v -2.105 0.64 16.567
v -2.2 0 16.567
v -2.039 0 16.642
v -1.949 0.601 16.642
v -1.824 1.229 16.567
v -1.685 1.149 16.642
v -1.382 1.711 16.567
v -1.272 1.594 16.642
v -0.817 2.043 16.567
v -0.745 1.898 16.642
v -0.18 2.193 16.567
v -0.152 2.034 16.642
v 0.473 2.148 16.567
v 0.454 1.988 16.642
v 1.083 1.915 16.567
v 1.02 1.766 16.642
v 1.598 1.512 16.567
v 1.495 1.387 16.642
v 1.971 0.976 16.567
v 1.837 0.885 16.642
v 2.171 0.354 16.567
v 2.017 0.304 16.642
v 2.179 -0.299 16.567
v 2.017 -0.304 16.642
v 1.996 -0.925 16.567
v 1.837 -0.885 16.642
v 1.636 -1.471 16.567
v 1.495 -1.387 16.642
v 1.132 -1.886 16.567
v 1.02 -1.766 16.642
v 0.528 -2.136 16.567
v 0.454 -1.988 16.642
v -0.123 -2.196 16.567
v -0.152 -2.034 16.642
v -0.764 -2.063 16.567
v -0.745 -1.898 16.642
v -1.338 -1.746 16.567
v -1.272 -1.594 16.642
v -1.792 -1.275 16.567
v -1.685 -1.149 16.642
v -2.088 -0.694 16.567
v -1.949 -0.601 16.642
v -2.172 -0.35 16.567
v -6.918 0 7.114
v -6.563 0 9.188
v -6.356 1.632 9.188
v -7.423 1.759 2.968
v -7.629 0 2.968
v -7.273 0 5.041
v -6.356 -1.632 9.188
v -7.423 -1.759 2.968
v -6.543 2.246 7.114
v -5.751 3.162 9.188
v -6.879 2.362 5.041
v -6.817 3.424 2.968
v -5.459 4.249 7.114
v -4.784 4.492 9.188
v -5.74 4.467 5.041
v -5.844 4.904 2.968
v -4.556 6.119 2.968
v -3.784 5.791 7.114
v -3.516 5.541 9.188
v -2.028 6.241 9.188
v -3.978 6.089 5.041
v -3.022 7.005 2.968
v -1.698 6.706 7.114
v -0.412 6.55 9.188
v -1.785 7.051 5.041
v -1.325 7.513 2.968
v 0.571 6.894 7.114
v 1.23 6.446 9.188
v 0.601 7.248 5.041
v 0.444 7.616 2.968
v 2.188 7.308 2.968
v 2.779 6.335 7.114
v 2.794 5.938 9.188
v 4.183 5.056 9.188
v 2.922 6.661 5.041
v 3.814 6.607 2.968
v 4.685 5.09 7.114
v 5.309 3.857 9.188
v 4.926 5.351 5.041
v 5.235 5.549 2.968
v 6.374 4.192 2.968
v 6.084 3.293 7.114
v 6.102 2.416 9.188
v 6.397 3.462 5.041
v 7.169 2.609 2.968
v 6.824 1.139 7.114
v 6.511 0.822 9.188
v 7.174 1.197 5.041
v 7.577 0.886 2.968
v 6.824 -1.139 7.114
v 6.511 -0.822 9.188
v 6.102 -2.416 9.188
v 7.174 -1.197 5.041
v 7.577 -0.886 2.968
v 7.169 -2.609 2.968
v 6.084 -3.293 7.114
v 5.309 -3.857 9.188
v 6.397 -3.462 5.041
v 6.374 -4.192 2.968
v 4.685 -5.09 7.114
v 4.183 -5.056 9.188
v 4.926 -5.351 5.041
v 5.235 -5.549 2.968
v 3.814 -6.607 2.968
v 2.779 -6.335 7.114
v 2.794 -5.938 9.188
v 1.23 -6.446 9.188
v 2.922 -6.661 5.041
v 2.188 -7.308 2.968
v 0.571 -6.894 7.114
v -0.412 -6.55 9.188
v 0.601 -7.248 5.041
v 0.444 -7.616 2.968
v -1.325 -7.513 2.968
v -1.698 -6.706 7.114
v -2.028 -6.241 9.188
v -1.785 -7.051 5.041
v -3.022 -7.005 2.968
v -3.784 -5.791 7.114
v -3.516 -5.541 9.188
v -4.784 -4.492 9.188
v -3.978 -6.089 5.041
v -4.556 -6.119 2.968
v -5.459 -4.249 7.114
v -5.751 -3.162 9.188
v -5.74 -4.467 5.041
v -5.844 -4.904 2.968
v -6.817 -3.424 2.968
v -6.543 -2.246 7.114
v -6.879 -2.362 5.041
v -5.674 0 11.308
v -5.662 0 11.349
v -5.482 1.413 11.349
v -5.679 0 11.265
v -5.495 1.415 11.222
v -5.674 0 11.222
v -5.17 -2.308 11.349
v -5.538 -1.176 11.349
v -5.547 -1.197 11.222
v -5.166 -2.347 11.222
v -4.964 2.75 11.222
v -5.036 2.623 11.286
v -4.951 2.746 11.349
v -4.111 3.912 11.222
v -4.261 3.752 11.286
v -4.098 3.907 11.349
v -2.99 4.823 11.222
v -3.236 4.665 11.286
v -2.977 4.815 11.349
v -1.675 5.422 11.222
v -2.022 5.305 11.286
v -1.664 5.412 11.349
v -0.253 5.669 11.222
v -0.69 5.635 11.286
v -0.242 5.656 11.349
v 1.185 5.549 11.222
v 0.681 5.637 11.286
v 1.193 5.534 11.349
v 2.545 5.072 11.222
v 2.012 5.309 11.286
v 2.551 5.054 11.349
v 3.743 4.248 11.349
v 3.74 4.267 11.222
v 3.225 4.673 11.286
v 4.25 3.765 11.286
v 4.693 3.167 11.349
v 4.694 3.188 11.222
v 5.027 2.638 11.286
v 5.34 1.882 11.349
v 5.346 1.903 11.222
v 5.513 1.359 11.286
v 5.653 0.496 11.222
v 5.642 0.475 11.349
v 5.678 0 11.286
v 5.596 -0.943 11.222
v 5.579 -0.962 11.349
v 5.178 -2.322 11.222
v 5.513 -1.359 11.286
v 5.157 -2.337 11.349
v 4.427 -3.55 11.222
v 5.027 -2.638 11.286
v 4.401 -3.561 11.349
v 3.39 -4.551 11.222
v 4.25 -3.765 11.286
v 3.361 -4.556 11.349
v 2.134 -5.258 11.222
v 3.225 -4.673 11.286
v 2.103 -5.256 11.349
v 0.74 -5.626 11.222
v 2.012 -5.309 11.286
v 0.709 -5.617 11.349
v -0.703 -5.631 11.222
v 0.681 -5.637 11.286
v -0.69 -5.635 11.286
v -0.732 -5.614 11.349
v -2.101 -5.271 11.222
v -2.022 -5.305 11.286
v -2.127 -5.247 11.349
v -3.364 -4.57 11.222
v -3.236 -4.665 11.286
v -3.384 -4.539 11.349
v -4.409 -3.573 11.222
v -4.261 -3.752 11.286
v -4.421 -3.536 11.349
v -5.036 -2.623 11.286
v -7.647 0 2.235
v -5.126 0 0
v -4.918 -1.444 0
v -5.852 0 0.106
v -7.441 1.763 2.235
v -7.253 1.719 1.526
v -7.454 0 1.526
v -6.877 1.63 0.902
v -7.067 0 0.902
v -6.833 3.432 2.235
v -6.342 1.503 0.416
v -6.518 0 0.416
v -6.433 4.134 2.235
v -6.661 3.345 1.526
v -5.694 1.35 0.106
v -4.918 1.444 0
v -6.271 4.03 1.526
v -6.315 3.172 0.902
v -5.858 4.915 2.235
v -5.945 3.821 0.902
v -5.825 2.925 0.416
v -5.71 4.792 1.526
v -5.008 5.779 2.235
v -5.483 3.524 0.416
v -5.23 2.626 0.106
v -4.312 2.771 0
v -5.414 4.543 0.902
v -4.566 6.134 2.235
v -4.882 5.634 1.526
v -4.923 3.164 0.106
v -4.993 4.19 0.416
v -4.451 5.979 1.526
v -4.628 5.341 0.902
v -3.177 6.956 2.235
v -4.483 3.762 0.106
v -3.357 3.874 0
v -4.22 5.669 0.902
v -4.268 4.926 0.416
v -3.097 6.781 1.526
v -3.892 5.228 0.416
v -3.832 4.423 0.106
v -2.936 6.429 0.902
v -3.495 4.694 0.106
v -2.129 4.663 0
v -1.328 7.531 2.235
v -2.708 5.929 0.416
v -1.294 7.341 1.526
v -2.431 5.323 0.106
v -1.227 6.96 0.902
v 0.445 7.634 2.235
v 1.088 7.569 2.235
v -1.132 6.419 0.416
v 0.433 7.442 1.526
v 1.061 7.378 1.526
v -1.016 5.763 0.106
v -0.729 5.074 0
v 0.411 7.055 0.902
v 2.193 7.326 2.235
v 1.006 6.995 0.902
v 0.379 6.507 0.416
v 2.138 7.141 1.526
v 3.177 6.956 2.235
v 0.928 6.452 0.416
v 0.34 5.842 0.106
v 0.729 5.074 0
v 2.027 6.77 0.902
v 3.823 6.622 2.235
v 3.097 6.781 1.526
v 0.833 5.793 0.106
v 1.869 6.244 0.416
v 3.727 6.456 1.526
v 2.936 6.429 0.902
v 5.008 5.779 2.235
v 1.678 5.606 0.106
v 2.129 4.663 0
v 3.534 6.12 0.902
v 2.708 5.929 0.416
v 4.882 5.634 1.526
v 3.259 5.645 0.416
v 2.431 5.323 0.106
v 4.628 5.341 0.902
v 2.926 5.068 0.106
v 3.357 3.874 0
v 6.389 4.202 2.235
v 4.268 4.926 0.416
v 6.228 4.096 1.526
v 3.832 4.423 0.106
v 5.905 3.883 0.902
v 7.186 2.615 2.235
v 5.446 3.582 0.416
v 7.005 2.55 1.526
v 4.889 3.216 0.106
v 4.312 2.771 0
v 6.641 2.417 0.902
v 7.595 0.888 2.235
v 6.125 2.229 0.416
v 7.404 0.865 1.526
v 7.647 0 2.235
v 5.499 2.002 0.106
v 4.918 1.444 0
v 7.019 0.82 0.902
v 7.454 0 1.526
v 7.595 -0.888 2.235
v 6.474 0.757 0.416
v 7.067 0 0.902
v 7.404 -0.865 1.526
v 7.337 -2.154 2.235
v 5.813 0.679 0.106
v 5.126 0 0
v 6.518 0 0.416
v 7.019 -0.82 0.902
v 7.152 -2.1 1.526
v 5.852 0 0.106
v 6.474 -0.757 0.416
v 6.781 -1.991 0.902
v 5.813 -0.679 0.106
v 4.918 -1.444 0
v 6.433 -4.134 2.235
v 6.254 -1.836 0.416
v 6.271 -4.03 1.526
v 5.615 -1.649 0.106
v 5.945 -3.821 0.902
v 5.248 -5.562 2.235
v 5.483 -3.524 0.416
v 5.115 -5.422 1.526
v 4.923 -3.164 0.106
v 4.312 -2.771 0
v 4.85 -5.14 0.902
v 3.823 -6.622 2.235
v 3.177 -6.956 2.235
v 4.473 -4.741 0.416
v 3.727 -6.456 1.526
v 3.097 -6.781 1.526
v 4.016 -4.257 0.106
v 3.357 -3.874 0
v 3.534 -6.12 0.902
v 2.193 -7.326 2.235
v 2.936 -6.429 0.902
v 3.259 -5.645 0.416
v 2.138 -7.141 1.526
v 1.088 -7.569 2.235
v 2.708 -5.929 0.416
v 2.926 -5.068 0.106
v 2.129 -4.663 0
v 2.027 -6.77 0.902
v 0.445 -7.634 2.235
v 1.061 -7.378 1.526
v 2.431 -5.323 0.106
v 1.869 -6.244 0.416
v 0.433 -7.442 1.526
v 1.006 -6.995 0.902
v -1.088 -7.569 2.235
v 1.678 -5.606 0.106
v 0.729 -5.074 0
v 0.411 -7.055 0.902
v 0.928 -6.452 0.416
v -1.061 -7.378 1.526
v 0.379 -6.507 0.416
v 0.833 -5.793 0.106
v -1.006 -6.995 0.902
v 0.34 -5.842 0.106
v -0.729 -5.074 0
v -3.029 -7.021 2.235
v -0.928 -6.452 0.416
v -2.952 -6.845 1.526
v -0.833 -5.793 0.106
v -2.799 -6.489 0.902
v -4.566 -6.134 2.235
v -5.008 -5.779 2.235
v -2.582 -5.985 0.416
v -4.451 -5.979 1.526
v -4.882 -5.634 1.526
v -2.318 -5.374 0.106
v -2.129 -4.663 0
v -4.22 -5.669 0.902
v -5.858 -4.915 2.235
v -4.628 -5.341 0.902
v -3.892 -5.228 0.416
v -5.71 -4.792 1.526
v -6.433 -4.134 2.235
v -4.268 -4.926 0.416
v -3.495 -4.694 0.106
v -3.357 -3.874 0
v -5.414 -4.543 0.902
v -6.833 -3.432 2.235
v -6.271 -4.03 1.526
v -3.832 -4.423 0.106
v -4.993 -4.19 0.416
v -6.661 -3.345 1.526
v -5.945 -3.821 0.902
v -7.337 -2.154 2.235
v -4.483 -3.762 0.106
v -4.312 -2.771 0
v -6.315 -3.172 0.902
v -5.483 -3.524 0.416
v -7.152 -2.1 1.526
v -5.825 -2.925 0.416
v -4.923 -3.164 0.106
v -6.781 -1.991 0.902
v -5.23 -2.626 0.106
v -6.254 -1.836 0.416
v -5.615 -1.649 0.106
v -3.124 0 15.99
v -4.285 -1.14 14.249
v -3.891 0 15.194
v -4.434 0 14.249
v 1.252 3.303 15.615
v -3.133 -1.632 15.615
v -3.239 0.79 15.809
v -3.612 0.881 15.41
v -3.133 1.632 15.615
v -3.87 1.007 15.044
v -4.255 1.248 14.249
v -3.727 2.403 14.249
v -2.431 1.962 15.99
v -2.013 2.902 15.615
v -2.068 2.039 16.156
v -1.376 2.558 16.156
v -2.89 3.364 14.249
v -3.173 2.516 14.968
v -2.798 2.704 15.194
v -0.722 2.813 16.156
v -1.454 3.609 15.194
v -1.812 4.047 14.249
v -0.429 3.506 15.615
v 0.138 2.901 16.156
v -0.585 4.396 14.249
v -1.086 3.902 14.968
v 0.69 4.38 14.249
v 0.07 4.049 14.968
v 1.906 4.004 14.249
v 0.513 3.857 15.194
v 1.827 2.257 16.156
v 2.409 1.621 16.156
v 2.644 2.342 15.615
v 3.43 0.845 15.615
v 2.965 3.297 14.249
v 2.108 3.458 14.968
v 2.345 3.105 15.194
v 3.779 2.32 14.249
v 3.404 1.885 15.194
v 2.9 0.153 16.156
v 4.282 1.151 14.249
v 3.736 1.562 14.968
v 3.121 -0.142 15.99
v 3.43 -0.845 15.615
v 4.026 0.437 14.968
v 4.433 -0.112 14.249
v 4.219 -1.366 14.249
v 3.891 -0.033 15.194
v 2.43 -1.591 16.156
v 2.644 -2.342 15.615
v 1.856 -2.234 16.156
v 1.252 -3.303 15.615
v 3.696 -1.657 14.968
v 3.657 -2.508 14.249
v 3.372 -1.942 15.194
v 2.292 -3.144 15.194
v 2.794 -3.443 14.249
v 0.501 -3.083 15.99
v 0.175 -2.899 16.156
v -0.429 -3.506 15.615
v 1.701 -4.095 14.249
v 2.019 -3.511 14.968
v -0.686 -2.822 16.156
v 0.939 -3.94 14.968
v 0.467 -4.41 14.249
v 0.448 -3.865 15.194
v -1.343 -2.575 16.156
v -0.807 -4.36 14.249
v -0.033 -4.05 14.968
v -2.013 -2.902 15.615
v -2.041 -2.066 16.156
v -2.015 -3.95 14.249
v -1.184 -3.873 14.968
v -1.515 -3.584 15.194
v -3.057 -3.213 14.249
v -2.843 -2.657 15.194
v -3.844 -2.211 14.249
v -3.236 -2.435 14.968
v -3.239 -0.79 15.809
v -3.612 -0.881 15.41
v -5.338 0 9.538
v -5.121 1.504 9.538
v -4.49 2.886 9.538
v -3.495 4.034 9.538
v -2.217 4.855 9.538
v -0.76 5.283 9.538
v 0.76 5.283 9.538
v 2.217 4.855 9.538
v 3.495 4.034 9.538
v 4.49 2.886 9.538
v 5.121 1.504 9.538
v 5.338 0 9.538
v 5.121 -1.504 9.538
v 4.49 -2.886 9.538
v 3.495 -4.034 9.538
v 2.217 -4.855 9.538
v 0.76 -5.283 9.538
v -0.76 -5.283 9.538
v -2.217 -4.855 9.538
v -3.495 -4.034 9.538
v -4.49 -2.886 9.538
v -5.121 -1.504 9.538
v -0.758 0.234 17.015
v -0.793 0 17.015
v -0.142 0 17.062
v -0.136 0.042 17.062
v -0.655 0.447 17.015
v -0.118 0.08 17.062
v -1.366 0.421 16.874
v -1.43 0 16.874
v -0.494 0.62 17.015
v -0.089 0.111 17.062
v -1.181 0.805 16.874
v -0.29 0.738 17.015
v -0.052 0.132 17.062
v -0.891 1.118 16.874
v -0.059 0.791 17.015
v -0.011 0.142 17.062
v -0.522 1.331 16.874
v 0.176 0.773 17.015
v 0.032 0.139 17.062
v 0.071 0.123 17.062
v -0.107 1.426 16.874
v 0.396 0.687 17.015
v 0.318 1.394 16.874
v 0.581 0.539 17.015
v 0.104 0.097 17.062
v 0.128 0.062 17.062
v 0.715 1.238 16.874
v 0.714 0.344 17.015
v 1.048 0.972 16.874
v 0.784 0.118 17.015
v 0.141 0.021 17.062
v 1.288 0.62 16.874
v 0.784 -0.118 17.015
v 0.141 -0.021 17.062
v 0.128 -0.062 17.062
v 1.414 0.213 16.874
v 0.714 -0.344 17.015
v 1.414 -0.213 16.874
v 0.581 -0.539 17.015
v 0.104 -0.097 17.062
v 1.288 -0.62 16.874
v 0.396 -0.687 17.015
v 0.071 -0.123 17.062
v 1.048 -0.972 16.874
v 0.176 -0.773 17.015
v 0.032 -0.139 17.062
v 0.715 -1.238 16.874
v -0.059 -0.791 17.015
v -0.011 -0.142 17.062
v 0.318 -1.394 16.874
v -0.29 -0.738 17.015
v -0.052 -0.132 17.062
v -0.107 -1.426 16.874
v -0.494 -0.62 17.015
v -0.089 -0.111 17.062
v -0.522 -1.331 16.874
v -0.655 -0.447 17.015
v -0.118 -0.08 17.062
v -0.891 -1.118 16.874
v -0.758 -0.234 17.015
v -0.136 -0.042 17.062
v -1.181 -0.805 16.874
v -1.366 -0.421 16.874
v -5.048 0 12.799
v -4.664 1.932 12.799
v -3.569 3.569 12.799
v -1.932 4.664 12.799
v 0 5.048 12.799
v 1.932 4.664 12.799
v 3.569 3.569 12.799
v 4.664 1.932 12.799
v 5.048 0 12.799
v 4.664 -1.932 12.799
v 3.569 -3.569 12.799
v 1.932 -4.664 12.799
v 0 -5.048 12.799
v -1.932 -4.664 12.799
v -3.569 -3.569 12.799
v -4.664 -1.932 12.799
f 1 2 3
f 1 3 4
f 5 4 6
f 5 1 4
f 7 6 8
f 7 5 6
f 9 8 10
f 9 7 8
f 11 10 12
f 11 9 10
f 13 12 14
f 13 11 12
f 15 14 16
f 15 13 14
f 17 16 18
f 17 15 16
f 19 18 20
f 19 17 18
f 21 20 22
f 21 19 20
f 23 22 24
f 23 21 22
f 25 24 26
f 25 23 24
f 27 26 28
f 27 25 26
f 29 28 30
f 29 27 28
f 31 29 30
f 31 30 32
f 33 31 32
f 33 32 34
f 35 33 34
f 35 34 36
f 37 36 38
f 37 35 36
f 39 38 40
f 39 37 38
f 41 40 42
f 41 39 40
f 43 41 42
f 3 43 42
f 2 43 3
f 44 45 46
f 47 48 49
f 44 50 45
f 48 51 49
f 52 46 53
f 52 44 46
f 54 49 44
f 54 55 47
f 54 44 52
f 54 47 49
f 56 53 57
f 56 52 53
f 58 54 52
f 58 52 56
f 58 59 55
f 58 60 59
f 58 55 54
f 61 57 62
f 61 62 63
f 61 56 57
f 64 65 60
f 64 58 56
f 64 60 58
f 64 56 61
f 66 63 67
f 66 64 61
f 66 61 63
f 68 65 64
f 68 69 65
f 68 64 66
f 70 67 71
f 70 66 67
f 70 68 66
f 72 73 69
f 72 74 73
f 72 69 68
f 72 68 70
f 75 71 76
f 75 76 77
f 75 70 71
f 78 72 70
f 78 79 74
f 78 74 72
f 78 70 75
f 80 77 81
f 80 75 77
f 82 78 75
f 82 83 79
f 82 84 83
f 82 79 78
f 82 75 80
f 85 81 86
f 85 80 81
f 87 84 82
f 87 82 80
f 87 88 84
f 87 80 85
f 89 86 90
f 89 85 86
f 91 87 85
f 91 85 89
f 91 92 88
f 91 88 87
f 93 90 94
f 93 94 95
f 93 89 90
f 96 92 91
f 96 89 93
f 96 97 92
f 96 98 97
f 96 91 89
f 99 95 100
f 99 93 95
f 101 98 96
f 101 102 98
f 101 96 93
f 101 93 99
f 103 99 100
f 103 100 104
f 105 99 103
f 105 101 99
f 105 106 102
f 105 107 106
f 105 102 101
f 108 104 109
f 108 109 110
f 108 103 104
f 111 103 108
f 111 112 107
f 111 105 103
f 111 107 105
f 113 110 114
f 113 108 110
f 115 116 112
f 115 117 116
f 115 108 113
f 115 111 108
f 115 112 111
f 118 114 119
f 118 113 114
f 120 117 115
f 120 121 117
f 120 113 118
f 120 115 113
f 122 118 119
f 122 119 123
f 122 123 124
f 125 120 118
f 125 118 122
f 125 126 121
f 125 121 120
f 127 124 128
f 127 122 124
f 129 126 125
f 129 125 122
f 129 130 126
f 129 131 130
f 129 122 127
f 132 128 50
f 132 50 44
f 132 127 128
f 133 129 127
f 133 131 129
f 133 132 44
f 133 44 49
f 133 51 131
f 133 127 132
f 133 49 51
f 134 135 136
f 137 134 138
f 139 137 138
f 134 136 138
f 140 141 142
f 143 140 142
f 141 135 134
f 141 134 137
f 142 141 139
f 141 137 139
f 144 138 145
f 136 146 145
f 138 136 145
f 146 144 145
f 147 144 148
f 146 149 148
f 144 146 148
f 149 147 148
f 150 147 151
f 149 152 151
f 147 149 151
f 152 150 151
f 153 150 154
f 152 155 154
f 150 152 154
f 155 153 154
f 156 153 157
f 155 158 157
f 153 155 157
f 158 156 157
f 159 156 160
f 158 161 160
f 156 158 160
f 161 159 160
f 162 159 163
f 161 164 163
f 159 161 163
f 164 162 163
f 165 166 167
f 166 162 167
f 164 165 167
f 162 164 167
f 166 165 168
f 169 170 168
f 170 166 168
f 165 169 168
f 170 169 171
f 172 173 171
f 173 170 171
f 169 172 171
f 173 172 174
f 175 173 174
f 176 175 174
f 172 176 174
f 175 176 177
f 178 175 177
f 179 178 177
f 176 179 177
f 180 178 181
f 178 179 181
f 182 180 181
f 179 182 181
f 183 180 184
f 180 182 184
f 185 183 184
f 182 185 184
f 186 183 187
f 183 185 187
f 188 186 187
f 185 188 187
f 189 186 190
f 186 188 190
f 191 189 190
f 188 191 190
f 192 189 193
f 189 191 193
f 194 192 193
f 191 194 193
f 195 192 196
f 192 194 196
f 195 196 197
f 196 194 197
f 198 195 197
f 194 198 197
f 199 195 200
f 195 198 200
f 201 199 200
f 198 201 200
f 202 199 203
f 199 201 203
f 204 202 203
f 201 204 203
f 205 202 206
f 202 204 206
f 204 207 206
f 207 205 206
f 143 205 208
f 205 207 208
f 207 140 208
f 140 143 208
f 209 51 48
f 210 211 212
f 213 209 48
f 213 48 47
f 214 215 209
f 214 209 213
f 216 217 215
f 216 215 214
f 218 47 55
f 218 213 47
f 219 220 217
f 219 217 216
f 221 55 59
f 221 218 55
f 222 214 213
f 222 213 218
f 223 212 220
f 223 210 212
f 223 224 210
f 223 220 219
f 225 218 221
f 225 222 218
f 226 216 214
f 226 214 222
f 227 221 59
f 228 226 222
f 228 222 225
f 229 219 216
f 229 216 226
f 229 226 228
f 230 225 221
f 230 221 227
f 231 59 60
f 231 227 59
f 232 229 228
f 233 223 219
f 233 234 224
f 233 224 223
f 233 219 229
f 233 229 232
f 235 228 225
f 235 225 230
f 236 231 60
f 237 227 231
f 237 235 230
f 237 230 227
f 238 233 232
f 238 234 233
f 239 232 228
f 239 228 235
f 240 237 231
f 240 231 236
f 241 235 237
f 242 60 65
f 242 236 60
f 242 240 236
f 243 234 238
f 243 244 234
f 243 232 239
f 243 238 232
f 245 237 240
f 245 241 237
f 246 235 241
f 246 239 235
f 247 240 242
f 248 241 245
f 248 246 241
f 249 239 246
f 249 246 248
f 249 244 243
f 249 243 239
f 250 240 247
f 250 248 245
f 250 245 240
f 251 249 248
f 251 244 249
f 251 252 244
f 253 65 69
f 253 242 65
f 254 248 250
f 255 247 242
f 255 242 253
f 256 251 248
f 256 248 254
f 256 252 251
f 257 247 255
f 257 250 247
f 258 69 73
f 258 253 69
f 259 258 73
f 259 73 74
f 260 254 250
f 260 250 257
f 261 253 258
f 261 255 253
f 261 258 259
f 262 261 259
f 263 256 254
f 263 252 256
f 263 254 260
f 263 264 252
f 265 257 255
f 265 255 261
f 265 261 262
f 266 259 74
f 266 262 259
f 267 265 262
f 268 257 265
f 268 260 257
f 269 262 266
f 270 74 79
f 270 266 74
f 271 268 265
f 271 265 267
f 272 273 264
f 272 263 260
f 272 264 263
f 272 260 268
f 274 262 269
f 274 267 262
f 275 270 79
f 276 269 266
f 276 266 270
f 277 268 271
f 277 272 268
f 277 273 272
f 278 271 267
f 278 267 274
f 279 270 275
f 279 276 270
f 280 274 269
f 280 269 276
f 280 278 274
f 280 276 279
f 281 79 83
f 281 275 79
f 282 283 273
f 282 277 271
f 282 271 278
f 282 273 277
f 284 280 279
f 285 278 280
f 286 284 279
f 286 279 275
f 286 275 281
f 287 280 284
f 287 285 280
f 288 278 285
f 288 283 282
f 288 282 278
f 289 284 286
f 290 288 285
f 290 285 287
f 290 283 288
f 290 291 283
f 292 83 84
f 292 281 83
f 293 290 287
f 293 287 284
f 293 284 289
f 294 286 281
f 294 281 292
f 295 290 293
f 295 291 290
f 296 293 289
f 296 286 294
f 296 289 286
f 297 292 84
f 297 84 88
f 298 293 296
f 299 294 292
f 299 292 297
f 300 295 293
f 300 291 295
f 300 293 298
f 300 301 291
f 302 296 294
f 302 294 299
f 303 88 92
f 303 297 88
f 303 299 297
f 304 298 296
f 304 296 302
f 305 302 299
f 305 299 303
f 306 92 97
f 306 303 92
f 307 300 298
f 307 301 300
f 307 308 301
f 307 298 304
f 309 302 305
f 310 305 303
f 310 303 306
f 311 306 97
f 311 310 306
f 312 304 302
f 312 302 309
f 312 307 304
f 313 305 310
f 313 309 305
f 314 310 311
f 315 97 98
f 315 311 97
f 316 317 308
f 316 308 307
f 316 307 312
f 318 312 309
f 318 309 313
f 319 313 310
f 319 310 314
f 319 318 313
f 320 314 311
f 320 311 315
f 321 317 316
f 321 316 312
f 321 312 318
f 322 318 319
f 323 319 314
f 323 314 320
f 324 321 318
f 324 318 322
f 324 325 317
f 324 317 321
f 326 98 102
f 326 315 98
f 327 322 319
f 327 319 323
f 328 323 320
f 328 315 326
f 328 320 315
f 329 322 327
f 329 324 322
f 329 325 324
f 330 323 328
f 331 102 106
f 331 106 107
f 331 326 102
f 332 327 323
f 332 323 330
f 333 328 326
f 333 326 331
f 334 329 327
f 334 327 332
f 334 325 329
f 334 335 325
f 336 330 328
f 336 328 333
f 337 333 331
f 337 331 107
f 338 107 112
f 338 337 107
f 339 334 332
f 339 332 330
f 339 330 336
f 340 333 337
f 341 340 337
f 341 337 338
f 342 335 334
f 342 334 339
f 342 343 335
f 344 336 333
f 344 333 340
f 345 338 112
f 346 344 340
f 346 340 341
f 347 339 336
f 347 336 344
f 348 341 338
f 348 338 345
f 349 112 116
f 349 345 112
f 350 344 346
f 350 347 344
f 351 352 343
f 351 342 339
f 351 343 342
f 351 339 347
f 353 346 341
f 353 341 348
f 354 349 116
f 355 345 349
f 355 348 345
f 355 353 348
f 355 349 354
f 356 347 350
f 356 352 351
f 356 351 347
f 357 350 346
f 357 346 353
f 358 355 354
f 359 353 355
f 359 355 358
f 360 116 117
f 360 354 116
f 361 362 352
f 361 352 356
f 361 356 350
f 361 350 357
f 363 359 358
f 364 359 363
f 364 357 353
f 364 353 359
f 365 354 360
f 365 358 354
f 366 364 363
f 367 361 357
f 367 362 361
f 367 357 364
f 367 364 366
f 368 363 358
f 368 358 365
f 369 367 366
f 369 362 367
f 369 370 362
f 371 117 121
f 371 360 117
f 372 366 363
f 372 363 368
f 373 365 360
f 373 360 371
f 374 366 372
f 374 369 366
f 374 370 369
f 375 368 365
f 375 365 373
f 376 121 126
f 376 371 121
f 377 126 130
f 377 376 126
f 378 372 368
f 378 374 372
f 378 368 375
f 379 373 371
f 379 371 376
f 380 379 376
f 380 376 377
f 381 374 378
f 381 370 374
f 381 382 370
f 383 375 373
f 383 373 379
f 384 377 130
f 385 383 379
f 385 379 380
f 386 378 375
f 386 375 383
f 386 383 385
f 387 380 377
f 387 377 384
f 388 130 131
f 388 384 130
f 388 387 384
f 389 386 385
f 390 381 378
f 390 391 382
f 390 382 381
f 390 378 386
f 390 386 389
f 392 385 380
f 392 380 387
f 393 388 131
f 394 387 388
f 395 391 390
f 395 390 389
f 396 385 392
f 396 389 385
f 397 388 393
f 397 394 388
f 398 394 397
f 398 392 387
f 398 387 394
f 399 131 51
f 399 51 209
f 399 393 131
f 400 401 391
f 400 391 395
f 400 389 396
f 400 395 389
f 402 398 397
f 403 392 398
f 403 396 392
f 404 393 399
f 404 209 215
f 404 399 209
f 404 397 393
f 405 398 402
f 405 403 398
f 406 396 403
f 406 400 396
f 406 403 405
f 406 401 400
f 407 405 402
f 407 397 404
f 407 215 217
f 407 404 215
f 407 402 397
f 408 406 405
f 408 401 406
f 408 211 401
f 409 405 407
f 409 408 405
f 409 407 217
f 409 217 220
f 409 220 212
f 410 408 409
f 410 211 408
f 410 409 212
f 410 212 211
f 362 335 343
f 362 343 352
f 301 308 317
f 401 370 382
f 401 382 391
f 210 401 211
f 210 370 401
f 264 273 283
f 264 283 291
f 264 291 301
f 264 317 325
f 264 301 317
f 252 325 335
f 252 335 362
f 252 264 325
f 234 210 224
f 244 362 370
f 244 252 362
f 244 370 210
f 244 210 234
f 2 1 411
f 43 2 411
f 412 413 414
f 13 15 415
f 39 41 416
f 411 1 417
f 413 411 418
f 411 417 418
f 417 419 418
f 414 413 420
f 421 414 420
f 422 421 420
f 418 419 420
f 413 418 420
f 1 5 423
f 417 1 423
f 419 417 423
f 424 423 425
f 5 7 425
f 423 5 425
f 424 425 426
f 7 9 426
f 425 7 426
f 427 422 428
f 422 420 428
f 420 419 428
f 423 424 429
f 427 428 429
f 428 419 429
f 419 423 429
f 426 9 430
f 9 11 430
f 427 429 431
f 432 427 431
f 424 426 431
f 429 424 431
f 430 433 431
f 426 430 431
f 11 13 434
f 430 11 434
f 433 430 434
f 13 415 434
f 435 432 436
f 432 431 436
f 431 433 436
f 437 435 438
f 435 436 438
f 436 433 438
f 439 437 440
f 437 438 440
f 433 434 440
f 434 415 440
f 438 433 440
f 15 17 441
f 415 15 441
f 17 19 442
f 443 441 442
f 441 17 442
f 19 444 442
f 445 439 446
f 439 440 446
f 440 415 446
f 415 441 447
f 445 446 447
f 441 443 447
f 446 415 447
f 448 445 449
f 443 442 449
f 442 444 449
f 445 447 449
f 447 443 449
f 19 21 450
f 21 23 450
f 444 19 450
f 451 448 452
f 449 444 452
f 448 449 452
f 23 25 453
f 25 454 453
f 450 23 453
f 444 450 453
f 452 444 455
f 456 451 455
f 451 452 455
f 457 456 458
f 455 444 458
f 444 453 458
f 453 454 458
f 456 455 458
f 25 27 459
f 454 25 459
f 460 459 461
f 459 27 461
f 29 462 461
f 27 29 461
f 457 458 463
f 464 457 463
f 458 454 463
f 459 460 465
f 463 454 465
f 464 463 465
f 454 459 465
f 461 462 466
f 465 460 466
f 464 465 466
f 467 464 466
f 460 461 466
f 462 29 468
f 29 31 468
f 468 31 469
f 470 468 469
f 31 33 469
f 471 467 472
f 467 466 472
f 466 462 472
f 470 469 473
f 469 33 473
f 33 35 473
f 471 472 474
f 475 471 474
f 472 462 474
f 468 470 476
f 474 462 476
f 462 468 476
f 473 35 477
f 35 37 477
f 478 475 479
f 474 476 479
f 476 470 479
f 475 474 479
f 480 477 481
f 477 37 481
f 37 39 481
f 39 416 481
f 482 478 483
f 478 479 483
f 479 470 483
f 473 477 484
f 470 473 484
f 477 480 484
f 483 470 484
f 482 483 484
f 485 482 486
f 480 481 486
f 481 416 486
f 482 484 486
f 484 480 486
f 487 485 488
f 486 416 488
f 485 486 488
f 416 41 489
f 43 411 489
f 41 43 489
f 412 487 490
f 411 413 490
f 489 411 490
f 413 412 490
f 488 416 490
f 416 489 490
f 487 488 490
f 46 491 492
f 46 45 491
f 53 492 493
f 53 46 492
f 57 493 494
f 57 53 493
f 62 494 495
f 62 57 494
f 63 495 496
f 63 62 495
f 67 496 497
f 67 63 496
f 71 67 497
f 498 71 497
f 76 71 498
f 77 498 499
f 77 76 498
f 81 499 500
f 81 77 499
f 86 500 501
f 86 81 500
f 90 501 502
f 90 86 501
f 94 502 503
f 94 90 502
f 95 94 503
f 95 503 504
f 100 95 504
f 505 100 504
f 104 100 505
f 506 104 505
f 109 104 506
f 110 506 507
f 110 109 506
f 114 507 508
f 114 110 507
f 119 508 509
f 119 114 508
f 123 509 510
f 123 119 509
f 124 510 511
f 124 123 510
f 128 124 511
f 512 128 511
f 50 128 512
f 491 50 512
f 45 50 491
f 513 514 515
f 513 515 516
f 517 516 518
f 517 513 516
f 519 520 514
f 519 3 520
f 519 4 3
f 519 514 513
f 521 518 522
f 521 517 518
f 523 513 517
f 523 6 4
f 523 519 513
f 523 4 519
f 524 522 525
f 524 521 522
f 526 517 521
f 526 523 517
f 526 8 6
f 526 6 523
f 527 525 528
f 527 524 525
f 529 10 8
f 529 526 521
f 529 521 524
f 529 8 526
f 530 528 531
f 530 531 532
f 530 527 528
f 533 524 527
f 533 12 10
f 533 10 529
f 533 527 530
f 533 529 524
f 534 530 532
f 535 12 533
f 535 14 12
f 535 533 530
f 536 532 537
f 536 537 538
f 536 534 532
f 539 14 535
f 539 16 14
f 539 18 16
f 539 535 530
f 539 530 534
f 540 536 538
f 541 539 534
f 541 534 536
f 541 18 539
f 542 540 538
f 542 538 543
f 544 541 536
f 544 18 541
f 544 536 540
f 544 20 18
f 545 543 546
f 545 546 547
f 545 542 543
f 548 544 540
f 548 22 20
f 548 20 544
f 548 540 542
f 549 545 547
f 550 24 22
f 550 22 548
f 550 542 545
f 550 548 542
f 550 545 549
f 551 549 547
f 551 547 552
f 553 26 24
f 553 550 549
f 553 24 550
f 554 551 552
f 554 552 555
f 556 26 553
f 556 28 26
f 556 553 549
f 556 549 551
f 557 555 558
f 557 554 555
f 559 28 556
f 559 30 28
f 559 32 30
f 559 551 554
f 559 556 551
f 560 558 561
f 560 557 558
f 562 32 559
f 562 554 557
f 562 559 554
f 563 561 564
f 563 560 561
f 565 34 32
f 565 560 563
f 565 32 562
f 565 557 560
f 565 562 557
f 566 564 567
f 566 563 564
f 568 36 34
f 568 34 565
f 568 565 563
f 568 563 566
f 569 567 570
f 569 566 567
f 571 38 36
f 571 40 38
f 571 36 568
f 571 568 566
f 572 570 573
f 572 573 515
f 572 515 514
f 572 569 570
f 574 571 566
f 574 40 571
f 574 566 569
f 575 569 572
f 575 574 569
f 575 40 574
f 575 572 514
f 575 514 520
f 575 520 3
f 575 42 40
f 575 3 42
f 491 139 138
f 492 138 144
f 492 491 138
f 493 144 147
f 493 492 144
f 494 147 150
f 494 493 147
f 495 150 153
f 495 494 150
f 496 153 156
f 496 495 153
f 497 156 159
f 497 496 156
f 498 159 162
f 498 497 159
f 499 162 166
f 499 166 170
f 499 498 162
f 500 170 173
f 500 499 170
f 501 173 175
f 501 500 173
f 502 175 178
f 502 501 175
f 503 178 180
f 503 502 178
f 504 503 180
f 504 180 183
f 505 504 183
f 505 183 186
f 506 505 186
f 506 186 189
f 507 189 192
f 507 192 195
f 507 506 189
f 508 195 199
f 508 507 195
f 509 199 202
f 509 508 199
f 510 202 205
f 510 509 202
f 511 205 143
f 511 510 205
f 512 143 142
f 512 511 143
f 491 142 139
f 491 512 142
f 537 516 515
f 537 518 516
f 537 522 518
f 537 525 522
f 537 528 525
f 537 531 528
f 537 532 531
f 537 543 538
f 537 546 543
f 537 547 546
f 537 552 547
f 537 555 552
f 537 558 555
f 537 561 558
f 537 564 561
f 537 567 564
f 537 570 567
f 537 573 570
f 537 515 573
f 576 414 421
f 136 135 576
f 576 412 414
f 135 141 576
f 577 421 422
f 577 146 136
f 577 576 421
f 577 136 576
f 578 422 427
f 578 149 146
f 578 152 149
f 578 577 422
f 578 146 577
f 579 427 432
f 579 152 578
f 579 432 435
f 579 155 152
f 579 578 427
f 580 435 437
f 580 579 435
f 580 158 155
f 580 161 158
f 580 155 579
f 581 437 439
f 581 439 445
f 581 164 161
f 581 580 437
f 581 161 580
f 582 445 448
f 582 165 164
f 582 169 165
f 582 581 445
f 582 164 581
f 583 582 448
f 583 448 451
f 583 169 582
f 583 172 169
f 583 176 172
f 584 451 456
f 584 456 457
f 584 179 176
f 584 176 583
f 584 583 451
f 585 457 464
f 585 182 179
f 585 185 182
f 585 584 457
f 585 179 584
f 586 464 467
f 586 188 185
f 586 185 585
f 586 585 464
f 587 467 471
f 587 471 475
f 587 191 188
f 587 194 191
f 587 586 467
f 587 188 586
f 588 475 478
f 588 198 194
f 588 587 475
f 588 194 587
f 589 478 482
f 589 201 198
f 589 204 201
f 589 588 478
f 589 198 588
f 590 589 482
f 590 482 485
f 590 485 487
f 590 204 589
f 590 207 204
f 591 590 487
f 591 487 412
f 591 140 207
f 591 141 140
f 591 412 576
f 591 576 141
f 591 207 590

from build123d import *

# Parameters (mm, degrees)
F2_R = 4.486307
F3_R = 0.215658
F4_R = 2.5393


with BuildPart() as f1:
    # F0 (on Front) → F1 (revolve)
    with BuildSketch(Plane.XZ):
        Polygon((-8.137501, 0), (0, 0), (0, 17.0625), (-1.137501, 17.0625), (-3.762501, 15.8375), (-5.6875, 11.2875), (-5.3375, 9.5375), (-6.562501, 9.1875), align=None)
    revolve(axis=Axis((0, 0, 8.53125), (0, 0, -1)))

    # F2
    f2_edges = [f1.edges().sort_by_distance(p)[0] for p in [
        (1.137501, 0, 17.0625),
        (3.762501, 0, 15.8375),
        (-2.450001, 0, 16.45),
    ]]
    fillet(f2_edges, radius=F2_R)

    # F3
    f3_edges = [f1.edges().sort_by_distance(p)[0] for p in [
        (-5.060953, 0, 12.768431),
        (4.434386, 0, 14.249362),
        (5.6875, 0, 11.2875),
    ]]
    fillet(f3_edges, radius=F3_R)

    # F4
    f4_edges = [f1.edges().sort_by_distance(p)[0] for p in [
        (8.137501, 0, 0),
    ]]
    fillet(f4_edges, radius=F4_R)


solid = f1.part
